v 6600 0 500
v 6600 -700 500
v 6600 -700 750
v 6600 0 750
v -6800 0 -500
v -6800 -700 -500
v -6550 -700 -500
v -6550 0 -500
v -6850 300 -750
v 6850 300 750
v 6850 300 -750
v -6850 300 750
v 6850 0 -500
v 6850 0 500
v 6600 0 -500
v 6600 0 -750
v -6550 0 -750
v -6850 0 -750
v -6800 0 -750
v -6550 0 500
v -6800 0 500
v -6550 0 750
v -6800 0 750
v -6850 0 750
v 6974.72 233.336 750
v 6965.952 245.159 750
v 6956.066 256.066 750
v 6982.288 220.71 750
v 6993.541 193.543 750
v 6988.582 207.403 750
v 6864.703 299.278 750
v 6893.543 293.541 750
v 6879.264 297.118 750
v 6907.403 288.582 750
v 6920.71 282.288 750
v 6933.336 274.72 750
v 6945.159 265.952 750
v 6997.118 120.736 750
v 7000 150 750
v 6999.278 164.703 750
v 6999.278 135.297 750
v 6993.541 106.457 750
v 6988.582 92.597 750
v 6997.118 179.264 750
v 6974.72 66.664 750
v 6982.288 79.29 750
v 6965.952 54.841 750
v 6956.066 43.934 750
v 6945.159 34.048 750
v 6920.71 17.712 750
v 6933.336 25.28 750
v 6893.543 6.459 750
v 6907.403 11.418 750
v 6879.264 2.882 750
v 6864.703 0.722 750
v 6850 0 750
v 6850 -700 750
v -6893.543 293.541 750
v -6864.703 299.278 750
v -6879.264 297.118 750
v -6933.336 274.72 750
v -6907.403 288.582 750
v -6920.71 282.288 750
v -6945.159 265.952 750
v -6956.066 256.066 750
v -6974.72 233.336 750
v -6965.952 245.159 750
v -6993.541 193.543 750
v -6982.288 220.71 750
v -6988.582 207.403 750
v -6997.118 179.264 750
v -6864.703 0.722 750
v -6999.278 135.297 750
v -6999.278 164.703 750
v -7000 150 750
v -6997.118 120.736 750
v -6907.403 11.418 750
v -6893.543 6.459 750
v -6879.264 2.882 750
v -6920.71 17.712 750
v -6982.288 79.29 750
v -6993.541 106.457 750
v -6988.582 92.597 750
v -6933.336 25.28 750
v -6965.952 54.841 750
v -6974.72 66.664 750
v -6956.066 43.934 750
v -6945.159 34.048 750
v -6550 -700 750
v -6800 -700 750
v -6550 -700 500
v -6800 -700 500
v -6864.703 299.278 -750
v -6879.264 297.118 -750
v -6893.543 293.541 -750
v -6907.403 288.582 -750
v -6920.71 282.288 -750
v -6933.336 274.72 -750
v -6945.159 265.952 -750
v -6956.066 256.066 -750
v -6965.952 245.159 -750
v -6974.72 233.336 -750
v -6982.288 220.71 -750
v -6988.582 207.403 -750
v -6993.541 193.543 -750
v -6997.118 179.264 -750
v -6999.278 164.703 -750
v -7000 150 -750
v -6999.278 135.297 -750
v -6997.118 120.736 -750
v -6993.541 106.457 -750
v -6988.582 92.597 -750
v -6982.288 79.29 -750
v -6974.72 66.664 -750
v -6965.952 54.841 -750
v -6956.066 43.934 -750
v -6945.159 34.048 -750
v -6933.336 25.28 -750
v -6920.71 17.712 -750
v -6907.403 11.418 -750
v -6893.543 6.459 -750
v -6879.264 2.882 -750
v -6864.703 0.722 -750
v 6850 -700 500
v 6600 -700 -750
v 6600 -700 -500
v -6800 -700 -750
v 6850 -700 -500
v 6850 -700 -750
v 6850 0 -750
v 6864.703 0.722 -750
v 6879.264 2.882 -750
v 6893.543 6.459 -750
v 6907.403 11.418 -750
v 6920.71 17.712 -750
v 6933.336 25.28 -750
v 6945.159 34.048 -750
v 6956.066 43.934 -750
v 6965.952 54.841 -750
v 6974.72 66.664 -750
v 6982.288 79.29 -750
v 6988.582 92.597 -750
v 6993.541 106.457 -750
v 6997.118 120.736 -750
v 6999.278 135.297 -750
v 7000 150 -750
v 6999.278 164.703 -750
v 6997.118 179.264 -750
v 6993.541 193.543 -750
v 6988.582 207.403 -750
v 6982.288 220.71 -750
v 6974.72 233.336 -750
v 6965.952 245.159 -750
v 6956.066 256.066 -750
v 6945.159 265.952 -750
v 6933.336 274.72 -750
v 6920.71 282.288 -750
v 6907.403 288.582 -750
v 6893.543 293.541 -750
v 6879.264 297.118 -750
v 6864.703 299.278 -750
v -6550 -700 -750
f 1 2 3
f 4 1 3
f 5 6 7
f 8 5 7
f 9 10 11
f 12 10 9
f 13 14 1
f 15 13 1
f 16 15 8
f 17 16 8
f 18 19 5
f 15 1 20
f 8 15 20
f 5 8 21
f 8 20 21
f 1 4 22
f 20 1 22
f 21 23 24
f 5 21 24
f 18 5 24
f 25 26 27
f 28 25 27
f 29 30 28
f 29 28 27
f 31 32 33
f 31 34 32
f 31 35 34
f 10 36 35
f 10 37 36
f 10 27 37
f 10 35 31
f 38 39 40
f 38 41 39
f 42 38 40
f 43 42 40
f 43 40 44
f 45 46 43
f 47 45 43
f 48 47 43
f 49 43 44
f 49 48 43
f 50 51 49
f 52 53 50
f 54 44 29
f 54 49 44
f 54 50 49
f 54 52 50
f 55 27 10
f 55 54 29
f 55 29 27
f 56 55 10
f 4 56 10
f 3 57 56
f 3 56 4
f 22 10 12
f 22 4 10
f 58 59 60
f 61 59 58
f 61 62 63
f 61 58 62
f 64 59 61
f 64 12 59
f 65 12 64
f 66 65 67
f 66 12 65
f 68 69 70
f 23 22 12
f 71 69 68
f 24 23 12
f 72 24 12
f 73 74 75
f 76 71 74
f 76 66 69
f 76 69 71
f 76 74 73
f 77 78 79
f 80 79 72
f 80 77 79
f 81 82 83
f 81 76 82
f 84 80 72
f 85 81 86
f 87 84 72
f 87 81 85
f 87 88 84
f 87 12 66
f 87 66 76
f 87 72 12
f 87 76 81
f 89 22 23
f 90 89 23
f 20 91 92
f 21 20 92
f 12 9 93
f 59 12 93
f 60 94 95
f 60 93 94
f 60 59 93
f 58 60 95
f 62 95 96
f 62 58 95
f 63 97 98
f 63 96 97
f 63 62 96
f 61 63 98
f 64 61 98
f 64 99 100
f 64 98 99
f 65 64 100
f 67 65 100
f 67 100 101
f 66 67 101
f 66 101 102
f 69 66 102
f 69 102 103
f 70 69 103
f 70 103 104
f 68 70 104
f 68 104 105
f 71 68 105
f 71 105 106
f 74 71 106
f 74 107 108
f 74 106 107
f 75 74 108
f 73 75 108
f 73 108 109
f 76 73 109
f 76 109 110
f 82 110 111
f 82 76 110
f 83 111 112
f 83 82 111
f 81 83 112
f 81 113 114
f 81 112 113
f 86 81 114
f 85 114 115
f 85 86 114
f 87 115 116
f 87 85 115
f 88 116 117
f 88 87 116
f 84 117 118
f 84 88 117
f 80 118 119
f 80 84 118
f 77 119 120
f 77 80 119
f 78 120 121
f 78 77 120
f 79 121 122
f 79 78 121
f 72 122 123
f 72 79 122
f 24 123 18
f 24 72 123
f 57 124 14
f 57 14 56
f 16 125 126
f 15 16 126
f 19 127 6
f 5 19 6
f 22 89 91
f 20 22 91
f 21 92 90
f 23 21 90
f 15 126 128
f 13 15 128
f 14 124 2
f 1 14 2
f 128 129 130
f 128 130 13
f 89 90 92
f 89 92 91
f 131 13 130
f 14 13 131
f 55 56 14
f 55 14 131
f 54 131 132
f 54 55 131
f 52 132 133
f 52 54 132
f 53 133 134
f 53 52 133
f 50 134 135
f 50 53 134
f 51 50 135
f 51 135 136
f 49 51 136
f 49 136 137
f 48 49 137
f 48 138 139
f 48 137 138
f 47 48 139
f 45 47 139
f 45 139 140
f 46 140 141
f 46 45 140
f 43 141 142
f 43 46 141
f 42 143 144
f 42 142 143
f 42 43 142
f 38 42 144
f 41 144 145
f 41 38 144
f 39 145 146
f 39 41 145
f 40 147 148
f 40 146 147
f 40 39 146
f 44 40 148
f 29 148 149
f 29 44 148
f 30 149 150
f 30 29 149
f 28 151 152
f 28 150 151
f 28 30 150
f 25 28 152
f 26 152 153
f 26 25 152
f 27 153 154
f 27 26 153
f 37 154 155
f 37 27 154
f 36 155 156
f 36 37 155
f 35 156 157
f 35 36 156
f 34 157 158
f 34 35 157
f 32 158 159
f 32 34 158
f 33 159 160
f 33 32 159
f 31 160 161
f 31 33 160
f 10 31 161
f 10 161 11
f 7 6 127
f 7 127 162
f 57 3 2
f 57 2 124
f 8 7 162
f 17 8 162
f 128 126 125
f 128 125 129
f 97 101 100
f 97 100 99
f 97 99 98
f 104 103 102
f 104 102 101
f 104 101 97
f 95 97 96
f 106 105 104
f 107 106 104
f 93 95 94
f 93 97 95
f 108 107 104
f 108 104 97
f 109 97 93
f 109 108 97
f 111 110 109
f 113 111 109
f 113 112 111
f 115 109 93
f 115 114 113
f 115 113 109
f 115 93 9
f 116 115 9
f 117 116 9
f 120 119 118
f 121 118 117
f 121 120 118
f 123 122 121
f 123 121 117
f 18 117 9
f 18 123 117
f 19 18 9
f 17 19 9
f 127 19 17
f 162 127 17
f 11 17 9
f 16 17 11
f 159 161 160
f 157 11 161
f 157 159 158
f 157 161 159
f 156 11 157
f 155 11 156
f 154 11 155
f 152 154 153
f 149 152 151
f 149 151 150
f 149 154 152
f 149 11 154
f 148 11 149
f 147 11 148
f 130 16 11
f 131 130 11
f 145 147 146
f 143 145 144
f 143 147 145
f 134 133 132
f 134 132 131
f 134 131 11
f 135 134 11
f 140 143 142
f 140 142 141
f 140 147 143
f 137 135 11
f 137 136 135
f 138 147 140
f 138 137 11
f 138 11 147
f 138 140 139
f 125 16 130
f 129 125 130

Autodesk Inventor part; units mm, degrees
ref_plane "YZ Plane" through (0, 0, 0) normal (1, 0, 0) x (0, 1, 0)
ref_plane "XZ Plane" through (0, 0, 0) normal (0, 1, 0) x (-1, 0, 0)
ref_plane "XY Plane" through (0, 0, 0) normal (0, 0, 1) x (1, 0, 0)
sketch "Boceto1" plane through (0, 0, 0) normal (0, 1, 0) x (-1, 0, 0)
  line L0 (7000, -750) -> (-7000, -750)
  line L1 (-7000, -750) -> (-7000, 750)
  line L2 (-7000, 750) -> (7000, 750)
  line L3 (7000, 750) -> (7000, -750)
  line L4 (7000, -750) -> (-7000, 750) construction
  line L5 (-7000, -750) -> (7000, 750) construction
  point P0 (0, 0)
  dimension "d0" = 14000
  dimension "d1" = 1500
extrude "Extrusión1" add sketch "Boceto1" along normal blind 300
sketch "Boceto2" plane through (-7000, 0, 750) normal (0, 0, 1) x (1, 0, 0)
  line L0 (14000, 0) -> (14000, 300) projected
  line L1 (0, 300) -> (14000, 300) projected
  line L2 (0, 0) -> (14000, 0) projected
  line L3 (0, 0) -> (0, 300) projected
  circle A0 centre (13850, 150) radius 150
  circle A1 centre (150, 150) radius 150
  line L4 (13850, 300) -> (14000, 300)
  line L5 (14000, 0) -> (13850, 0)
  line L6 (150, 0) -> (0, 0)
  line L7 (0, 300) -> (150, 300)
  line L8 (0, 0) -> (0, 300)
  line L9 (14000, 0) -> (14000, 300)
  point P0 (7000, 0)
  point P1 (14000, 150)
  point P2 (0, 150)
extrude "Extrusión2" cut sketch "Boceto2" against normal through all contours L2 A0 L0 | A0 L1 L0 | L2 L3 A1 | A1 L3 L1
sketch "Boceto3" plane through (0, 0, 0) normal (0, -1, 0) x (1, 0, 0)
  line L0 (-6850, 750) -> (6850, 750) projected
  line L1 (6850, -750) -> (6850, 750) projected
  line L2 (6850, -750) -> (-6850, -750) projected
  line L3 (-6850, -750) -> (-6850, 750) projected
  line L4 (6850, 750) -> (6850, 500)
  line L5 (6850, 500) -> (6600, 500)
  line L6 (6600, 500) -> (6600, 750)
  line L7 (6600, 750) -> (6850, 750)
  line L8 (6850, -500) -> (6850, -750)
  line L9 (6850, -750) -> (6600, -750)
  line L10 (6600, -750) -> (6600, -500)
  line L11 (6600, -500) -> (6850, -500)
  line L12 (-6550, 750) -> (-6550, 500)
  line L13 (-6550, 500) -> (-6800, 500)
  line L14 (-6800, 500) -> (-6800, 750)
  line L15 (-6800, 750) -> (-6550, 750)
  line L16 (-6550, -500) -> (-6550, -750)
  line L17 (-6550, -750) -> (-6800, -750)
  line L18 (-6800, -750) -> (-6800, -500)
  line L19 (-6800, -500) -> (-6550, -500)
  point P0 (0, 0)
  point P1 (6600, 750)
  point P2 (6600, -750)
  point P3 (-6800, 750)
  point P4 (-6800, -750)
  point P5 (-6550, -750)
  dimension "d6" = 250
  dimension "d7" = 250
  dimension "d10" = 1250
  dimension "d13" = 13400
extrude "Extrusión3" add sketch "Boceto3" along normal blind 700 contours L0 L12 L13 L14 | L18 L19 L16 L2 | L0 L1 L5 L6 | L10 L11 L1 L2
equation "\"d0\" = L"
equation "\"L\" = 14000"
properties part number "SoporteBanda"
